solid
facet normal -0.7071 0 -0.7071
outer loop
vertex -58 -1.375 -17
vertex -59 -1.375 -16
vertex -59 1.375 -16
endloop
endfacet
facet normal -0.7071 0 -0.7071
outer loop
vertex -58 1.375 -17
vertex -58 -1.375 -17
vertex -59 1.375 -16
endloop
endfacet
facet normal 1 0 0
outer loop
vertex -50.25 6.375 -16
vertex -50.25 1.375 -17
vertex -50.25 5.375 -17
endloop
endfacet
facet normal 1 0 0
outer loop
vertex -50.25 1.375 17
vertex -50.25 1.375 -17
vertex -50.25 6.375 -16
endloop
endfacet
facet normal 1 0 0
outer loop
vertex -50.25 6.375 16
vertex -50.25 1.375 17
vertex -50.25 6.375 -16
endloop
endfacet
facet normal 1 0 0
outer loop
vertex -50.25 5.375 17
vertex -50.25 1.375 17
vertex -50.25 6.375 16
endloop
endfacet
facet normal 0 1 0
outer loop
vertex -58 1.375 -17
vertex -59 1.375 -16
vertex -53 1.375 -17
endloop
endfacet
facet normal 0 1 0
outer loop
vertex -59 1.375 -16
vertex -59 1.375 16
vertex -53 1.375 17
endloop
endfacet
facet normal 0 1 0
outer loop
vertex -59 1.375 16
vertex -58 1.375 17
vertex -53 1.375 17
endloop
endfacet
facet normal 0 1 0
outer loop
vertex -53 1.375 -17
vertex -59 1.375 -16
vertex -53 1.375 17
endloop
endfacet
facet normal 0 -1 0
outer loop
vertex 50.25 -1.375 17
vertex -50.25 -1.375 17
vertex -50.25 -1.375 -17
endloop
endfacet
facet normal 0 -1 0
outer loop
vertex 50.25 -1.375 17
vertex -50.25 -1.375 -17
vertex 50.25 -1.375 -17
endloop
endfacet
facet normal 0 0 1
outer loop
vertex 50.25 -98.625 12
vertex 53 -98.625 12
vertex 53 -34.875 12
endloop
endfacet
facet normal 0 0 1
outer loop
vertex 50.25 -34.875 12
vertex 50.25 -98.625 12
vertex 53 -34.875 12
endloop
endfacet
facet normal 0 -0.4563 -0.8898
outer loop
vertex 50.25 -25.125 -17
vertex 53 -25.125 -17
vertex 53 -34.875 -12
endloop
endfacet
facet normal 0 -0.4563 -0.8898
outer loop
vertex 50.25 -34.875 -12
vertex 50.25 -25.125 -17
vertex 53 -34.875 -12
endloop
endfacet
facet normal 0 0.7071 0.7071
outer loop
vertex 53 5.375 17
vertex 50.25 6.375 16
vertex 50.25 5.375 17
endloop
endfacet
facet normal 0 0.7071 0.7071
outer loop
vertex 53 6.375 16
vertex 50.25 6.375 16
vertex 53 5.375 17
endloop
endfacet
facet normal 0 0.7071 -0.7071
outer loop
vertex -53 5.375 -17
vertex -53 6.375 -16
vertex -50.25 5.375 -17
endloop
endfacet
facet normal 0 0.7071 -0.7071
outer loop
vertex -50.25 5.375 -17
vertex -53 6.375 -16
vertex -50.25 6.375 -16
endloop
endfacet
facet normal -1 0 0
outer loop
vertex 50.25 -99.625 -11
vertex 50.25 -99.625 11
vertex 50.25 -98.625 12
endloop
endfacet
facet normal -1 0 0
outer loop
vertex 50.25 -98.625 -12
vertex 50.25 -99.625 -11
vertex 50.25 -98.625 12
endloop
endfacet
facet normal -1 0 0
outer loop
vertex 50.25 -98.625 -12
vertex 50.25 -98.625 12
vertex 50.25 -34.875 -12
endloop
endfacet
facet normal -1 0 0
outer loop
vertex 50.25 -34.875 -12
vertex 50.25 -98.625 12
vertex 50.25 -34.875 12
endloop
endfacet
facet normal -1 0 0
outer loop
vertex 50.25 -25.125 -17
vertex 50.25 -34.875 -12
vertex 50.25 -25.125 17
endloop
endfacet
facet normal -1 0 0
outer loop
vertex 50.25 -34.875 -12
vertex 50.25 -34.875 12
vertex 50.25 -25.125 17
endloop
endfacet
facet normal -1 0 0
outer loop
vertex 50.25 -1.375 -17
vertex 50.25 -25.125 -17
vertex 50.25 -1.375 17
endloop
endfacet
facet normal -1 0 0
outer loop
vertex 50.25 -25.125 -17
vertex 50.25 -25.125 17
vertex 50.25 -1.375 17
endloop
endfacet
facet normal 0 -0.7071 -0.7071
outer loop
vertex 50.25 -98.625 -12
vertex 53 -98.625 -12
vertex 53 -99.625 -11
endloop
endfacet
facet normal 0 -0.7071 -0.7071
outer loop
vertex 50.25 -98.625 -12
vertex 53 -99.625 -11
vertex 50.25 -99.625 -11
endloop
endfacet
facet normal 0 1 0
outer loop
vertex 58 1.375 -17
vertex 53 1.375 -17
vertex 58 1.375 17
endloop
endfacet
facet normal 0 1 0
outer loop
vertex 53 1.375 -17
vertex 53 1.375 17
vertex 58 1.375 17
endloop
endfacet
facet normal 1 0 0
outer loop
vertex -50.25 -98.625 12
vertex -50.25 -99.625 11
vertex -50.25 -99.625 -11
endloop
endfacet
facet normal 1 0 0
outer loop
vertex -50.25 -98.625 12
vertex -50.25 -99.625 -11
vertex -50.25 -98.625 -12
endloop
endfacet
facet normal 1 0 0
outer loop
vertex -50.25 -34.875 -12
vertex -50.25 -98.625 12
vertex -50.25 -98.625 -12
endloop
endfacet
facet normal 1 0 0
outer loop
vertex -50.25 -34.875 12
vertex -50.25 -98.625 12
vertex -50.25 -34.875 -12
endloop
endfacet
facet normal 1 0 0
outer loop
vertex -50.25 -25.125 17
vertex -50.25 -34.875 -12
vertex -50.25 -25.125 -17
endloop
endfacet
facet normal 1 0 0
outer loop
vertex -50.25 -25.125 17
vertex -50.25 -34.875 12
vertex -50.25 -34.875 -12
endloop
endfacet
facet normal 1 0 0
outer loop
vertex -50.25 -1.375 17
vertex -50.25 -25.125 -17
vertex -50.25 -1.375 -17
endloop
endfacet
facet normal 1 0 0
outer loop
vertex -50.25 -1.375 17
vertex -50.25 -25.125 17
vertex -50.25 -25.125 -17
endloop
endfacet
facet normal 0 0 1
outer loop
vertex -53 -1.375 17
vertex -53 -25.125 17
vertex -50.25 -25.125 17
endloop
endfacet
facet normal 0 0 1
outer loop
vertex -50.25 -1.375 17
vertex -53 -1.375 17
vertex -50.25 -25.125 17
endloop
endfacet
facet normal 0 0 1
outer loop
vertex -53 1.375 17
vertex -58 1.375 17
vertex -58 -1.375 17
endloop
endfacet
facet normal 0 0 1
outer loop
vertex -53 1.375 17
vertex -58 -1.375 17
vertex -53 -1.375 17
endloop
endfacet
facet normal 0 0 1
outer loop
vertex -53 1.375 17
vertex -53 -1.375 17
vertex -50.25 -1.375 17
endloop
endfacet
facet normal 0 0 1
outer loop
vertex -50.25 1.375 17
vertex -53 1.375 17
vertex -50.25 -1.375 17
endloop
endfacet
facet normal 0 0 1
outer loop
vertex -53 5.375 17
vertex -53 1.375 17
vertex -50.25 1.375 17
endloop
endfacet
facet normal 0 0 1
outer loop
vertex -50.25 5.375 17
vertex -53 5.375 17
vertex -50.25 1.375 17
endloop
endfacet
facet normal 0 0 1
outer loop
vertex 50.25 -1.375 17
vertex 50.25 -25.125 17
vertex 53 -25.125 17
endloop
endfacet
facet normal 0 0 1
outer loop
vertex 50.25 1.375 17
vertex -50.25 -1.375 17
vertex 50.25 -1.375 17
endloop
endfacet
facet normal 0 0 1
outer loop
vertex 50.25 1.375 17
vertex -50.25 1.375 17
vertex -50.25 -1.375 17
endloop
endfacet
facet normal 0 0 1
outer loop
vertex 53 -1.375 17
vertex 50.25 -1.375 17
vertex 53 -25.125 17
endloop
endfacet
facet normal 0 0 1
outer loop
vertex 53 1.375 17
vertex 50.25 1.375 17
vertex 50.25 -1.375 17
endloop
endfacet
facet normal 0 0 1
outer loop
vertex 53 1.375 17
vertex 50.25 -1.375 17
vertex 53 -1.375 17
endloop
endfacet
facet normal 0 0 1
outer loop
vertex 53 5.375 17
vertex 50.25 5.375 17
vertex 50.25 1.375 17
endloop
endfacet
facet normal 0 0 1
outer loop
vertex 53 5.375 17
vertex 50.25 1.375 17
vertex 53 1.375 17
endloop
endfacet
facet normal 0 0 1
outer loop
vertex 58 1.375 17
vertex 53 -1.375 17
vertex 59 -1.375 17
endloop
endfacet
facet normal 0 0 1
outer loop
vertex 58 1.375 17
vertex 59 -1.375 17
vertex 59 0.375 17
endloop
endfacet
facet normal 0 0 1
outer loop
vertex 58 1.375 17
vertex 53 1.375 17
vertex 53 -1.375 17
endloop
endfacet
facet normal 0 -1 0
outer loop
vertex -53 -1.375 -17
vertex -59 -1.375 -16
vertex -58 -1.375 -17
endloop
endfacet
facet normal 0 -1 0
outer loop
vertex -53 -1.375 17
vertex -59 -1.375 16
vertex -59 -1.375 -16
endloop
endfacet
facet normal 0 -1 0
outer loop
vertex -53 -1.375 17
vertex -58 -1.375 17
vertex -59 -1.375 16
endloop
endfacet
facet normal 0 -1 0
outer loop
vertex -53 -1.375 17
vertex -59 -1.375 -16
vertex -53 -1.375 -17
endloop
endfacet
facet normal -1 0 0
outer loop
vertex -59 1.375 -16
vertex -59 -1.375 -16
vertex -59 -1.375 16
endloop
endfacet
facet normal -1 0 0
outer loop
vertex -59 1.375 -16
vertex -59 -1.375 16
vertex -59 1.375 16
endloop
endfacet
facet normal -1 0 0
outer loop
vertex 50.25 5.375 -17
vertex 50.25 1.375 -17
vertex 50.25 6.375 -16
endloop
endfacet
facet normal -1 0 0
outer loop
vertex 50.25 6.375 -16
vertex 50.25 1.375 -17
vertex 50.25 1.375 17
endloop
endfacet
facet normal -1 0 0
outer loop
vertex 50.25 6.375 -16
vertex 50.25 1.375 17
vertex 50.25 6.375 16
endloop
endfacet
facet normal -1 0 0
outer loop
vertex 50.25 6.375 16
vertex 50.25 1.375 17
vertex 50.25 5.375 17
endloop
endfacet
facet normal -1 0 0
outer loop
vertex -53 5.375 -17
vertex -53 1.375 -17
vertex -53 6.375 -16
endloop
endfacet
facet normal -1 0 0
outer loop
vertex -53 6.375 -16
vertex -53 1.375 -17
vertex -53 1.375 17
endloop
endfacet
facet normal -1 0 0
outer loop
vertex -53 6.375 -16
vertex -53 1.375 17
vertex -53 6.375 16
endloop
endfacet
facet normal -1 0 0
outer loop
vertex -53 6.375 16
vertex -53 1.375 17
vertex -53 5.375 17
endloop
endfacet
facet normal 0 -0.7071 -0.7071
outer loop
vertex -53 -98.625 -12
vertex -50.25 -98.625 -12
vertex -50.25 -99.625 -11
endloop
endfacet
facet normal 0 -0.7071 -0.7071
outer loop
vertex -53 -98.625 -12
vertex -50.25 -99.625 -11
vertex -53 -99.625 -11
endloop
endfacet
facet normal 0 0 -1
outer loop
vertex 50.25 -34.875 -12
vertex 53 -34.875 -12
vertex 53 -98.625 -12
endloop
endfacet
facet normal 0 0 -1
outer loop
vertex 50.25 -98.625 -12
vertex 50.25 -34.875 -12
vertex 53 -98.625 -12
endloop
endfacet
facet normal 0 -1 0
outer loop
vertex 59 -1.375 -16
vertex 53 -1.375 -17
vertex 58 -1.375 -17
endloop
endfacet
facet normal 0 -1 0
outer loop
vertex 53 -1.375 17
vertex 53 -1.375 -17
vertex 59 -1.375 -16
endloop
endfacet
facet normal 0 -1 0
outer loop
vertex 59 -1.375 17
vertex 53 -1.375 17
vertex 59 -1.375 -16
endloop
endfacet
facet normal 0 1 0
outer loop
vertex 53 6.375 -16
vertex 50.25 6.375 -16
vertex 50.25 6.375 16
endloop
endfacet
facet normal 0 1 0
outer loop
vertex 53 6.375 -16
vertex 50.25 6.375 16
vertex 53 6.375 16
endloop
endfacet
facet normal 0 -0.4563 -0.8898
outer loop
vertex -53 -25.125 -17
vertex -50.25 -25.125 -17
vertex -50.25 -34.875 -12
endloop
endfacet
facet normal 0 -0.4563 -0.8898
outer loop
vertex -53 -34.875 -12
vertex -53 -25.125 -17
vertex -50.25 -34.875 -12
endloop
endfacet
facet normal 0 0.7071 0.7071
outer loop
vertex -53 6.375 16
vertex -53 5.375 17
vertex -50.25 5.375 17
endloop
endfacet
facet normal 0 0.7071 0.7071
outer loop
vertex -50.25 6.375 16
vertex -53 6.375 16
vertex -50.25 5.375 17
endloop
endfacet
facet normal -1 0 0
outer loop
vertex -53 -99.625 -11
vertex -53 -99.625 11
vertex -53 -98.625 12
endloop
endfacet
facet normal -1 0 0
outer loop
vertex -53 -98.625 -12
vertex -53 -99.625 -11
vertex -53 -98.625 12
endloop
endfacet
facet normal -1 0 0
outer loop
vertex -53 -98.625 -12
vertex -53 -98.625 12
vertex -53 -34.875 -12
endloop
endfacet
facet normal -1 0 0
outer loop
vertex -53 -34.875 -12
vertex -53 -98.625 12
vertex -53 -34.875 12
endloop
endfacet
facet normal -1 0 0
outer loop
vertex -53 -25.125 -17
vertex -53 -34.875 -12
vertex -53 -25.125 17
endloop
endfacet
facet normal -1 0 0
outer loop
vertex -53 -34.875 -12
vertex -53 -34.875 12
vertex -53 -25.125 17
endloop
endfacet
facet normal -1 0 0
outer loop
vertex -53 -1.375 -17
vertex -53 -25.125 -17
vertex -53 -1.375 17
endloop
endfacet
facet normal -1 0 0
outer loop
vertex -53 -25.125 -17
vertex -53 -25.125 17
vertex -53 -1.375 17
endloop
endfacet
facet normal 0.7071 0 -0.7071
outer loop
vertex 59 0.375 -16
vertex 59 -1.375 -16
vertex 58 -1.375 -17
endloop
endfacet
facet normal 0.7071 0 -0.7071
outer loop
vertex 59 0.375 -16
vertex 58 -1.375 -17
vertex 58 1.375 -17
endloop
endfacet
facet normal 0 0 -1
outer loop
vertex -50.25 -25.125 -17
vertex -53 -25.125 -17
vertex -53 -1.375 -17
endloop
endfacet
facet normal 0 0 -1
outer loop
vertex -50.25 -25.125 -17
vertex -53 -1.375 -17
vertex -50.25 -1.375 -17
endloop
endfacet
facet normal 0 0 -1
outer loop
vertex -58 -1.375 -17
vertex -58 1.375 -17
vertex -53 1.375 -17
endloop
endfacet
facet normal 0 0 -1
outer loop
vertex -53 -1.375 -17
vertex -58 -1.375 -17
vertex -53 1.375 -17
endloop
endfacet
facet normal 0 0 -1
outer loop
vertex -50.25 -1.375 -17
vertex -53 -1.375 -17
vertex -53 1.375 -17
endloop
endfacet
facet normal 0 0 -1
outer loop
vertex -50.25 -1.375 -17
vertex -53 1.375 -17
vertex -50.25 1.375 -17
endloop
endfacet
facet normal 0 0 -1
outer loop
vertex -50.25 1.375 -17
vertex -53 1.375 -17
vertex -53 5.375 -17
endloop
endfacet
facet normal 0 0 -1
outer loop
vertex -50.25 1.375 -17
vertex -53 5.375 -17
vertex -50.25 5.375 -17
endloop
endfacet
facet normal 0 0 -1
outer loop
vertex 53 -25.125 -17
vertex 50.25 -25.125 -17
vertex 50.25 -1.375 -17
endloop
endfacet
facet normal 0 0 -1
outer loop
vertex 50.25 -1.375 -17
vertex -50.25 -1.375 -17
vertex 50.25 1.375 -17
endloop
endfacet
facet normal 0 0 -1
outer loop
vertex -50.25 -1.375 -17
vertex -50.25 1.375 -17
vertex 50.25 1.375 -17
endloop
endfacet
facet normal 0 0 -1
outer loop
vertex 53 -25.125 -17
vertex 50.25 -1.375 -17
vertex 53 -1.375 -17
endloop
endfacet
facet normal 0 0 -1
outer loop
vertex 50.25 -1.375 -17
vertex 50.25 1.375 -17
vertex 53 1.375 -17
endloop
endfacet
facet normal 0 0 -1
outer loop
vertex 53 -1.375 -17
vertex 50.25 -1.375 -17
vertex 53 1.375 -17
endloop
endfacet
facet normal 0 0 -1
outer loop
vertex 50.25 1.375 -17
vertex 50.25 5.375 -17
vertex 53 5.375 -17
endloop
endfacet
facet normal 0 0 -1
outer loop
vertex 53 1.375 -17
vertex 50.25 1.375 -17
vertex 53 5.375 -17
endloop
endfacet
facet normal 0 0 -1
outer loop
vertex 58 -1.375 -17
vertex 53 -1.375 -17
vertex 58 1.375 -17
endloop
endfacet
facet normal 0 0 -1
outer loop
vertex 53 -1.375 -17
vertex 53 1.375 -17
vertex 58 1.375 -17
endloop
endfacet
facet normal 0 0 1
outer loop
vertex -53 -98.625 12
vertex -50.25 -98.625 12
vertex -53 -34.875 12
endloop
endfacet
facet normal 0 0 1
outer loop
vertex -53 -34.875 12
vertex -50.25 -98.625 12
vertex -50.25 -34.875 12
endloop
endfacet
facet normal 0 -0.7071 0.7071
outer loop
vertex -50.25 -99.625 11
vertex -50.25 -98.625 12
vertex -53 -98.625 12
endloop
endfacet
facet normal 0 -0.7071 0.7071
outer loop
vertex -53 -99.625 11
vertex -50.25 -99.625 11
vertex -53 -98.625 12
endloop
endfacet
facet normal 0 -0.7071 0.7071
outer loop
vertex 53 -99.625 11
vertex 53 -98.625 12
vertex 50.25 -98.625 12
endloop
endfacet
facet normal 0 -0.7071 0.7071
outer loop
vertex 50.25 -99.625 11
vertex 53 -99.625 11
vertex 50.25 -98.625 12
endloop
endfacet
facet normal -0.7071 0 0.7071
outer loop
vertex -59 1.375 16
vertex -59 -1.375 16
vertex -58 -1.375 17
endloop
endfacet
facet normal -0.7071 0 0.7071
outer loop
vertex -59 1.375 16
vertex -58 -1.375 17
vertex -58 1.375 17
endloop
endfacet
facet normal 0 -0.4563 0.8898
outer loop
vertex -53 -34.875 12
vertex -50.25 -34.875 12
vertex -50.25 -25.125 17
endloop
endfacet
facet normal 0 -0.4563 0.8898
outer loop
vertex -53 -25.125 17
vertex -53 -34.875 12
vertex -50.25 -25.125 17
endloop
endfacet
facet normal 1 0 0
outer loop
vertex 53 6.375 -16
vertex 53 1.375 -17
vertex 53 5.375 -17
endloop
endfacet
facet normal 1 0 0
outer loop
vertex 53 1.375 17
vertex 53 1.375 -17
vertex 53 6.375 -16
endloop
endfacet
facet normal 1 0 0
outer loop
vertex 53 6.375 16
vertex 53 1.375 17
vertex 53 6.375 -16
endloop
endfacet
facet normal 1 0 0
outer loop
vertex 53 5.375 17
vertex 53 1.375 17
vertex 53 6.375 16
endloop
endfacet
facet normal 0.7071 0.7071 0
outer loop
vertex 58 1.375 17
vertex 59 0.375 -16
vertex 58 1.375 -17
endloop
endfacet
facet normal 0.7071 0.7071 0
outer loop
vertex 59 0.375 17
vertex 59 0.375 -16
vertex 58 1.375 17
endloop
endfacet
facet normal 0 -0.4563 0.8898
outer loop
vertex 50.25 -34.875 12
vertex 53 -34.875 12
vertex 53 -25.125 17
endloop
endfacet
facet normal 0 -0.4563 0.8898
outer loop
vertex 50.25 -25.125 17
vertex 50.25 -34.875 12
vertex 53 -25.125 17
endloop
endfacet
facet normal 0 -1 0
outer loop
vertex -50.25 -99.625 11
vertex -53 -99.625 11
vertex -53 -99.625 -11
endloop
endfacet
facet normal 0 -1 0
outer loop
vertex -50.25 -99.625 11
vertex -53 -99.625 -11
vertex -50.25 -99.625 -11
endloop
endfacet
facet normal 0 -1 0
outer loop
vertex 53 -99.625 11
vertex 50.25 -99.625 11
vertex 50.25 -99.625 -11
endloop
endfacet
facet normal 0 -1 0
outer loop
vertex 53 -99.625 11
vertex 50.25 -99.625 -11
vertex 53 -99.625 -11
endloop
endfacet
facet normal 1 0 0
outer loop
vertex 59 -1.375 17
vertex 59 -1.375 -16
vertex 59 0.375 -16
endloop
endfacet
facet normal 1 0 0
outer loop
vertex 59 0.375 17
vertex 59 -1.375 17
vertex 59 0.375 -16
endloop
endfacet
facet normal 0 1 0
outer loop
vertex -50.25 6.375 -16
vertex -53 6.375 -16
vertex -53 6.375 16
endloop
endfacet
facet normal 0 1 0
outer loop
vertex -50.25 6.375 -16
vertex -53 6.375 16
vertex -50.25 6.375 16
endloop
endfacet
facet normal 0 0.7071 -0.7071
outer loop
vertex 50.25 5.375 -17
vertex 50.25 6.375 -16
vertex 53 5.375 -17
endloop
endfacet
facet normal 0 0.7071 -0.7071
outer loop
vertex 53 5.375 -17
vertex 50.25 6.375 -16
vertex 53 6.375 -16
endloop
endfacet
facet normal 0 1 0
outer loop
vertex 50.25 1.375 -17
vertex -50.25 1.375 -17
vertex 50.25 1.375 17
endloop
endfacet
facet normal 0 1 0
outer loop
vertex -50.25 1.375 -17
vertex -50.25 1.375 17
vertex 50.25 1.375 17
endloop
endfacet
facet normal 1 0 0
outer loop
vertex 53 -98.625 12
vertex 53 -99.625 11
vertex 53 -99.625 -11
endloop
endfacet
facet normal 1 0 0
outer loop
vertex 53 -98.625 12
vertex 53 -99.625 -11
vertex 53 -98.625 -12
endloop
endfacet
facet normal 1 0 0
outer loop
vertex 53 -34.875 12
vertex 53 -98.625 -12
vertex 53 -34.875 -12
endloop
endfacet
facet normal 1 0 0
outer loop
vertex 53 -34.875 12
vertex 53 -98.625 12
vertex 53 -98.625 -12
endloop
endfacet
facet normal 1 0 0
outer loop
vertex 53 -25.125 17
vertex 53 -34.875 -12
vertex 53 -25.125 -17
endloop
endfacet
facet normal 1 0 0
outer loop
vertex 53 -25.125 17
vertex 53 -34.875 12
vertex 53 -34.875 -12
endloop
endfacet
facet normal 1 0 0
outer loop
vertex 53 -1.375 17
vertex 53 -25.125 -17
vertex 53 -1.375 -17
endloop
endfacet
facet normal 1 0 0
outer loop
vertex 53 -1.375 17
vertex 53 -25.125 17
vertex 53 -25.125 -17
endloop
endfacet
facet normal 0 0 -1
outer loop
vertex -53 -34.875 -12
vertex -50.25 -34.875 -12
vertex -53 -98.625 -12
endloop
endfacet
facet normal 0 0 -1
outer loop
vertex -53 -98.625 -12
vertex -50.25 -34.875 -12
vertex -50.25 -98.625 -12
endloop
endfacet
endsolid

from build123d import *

# Parameters (mm, degrees)
SKETCH1_W           = 2.75
SKETCH1_H           = 5
SKETCH1_W_2         = 6
SKETCH1_H_2         = 2.75
SKETCH1_H_3         = 98.25
SKETCH1_W_3         = 100.5
BOSS_EXTRUDE1_DEPTH = 17
CUT_EXTRUDE1_DEPTH  = 113
CHAMFER1_SIZE       = 1


with BuildPart() as part:
    # Sketch1 → Boss-Extrude1 (new body, symmetric)
    with BuildSketch(Plane.XY):
        with Locations((-51.625, 3.875)):
            Rectangle(SKETCH1_W, SKETCH1_H)
        with Locations((-56, 0)):
            Rectangle(SKETCH1_W_2, SKETCH1_H_2)
        with Locations((-51.625, 0)):
            Rectangle(SKETCH1_W, SKETCH1_H_2)
        with Locations((-51.625, -50.5)):
            Rectangle(SKETCH1_W, SKETCH1_H_3)
        Rectangle(SKETCH1_W_3, SKETCH1_H_2)
        with Locations((51.625, 3.875)):
            Rectangle(SKETCH1_W, SKETCH1_H)
        with Locations((51.625, 0)):
            Rectangle(SKETCH1_W, SKETCH1_H_2)
        with Locations((56, 0)):
            Rectangle(SKETCH1_W_2, SKETCH1_H_2)
        with Locations((51.625, -50.5)):
            Rectangle(SKETCH1_W, SKETCH1_H_3)
    extrude(amount=BOSS_EXTRUDE1_DEPTH, both=True)

    # Sketch2 → Cut-Extrude1 (cut, through all)
    with BuildSketch(Plane(origin=(53, 0, 0), x_dir=(0, 0, -1), z_dir=(1, 0, 0))):
        Polygon((-12, -34.875), (-17, -25.125), (-17, -99.625), (-12, -99.625), align=None)
        Polygon((17, -99.625), (17, -25.125), (12, -34.875), (12, -99.625), align=None)
    extrude(amount=-CUT_EXTRUDE1_DEPTH, mode=Mode.SUBTRACT)

    # Chamfer1
    chamfer1_edges = [part.edges().sort_by_distance(p)[0] for p in [
        (-51.625, 6.375, 17),
        (51.625, -99.625, -12),
        (-59, 0, 17),
        (-51.625, 6.375, -17),
        (51.625, 6.375, -17),
        (59, 0, -17),
        (-59, 0, -17),
        (59, 1.375, 0),
        (51.625, 6.375, 17),
        (-51.625, -99.625, 12),
        (51.625, -99.625, 12),
        (-51.625, -99.625, -12),
    ]]
    chamfer(chamfer1_edges, length=CHAMFER1_SIZE)


solid = part.part
